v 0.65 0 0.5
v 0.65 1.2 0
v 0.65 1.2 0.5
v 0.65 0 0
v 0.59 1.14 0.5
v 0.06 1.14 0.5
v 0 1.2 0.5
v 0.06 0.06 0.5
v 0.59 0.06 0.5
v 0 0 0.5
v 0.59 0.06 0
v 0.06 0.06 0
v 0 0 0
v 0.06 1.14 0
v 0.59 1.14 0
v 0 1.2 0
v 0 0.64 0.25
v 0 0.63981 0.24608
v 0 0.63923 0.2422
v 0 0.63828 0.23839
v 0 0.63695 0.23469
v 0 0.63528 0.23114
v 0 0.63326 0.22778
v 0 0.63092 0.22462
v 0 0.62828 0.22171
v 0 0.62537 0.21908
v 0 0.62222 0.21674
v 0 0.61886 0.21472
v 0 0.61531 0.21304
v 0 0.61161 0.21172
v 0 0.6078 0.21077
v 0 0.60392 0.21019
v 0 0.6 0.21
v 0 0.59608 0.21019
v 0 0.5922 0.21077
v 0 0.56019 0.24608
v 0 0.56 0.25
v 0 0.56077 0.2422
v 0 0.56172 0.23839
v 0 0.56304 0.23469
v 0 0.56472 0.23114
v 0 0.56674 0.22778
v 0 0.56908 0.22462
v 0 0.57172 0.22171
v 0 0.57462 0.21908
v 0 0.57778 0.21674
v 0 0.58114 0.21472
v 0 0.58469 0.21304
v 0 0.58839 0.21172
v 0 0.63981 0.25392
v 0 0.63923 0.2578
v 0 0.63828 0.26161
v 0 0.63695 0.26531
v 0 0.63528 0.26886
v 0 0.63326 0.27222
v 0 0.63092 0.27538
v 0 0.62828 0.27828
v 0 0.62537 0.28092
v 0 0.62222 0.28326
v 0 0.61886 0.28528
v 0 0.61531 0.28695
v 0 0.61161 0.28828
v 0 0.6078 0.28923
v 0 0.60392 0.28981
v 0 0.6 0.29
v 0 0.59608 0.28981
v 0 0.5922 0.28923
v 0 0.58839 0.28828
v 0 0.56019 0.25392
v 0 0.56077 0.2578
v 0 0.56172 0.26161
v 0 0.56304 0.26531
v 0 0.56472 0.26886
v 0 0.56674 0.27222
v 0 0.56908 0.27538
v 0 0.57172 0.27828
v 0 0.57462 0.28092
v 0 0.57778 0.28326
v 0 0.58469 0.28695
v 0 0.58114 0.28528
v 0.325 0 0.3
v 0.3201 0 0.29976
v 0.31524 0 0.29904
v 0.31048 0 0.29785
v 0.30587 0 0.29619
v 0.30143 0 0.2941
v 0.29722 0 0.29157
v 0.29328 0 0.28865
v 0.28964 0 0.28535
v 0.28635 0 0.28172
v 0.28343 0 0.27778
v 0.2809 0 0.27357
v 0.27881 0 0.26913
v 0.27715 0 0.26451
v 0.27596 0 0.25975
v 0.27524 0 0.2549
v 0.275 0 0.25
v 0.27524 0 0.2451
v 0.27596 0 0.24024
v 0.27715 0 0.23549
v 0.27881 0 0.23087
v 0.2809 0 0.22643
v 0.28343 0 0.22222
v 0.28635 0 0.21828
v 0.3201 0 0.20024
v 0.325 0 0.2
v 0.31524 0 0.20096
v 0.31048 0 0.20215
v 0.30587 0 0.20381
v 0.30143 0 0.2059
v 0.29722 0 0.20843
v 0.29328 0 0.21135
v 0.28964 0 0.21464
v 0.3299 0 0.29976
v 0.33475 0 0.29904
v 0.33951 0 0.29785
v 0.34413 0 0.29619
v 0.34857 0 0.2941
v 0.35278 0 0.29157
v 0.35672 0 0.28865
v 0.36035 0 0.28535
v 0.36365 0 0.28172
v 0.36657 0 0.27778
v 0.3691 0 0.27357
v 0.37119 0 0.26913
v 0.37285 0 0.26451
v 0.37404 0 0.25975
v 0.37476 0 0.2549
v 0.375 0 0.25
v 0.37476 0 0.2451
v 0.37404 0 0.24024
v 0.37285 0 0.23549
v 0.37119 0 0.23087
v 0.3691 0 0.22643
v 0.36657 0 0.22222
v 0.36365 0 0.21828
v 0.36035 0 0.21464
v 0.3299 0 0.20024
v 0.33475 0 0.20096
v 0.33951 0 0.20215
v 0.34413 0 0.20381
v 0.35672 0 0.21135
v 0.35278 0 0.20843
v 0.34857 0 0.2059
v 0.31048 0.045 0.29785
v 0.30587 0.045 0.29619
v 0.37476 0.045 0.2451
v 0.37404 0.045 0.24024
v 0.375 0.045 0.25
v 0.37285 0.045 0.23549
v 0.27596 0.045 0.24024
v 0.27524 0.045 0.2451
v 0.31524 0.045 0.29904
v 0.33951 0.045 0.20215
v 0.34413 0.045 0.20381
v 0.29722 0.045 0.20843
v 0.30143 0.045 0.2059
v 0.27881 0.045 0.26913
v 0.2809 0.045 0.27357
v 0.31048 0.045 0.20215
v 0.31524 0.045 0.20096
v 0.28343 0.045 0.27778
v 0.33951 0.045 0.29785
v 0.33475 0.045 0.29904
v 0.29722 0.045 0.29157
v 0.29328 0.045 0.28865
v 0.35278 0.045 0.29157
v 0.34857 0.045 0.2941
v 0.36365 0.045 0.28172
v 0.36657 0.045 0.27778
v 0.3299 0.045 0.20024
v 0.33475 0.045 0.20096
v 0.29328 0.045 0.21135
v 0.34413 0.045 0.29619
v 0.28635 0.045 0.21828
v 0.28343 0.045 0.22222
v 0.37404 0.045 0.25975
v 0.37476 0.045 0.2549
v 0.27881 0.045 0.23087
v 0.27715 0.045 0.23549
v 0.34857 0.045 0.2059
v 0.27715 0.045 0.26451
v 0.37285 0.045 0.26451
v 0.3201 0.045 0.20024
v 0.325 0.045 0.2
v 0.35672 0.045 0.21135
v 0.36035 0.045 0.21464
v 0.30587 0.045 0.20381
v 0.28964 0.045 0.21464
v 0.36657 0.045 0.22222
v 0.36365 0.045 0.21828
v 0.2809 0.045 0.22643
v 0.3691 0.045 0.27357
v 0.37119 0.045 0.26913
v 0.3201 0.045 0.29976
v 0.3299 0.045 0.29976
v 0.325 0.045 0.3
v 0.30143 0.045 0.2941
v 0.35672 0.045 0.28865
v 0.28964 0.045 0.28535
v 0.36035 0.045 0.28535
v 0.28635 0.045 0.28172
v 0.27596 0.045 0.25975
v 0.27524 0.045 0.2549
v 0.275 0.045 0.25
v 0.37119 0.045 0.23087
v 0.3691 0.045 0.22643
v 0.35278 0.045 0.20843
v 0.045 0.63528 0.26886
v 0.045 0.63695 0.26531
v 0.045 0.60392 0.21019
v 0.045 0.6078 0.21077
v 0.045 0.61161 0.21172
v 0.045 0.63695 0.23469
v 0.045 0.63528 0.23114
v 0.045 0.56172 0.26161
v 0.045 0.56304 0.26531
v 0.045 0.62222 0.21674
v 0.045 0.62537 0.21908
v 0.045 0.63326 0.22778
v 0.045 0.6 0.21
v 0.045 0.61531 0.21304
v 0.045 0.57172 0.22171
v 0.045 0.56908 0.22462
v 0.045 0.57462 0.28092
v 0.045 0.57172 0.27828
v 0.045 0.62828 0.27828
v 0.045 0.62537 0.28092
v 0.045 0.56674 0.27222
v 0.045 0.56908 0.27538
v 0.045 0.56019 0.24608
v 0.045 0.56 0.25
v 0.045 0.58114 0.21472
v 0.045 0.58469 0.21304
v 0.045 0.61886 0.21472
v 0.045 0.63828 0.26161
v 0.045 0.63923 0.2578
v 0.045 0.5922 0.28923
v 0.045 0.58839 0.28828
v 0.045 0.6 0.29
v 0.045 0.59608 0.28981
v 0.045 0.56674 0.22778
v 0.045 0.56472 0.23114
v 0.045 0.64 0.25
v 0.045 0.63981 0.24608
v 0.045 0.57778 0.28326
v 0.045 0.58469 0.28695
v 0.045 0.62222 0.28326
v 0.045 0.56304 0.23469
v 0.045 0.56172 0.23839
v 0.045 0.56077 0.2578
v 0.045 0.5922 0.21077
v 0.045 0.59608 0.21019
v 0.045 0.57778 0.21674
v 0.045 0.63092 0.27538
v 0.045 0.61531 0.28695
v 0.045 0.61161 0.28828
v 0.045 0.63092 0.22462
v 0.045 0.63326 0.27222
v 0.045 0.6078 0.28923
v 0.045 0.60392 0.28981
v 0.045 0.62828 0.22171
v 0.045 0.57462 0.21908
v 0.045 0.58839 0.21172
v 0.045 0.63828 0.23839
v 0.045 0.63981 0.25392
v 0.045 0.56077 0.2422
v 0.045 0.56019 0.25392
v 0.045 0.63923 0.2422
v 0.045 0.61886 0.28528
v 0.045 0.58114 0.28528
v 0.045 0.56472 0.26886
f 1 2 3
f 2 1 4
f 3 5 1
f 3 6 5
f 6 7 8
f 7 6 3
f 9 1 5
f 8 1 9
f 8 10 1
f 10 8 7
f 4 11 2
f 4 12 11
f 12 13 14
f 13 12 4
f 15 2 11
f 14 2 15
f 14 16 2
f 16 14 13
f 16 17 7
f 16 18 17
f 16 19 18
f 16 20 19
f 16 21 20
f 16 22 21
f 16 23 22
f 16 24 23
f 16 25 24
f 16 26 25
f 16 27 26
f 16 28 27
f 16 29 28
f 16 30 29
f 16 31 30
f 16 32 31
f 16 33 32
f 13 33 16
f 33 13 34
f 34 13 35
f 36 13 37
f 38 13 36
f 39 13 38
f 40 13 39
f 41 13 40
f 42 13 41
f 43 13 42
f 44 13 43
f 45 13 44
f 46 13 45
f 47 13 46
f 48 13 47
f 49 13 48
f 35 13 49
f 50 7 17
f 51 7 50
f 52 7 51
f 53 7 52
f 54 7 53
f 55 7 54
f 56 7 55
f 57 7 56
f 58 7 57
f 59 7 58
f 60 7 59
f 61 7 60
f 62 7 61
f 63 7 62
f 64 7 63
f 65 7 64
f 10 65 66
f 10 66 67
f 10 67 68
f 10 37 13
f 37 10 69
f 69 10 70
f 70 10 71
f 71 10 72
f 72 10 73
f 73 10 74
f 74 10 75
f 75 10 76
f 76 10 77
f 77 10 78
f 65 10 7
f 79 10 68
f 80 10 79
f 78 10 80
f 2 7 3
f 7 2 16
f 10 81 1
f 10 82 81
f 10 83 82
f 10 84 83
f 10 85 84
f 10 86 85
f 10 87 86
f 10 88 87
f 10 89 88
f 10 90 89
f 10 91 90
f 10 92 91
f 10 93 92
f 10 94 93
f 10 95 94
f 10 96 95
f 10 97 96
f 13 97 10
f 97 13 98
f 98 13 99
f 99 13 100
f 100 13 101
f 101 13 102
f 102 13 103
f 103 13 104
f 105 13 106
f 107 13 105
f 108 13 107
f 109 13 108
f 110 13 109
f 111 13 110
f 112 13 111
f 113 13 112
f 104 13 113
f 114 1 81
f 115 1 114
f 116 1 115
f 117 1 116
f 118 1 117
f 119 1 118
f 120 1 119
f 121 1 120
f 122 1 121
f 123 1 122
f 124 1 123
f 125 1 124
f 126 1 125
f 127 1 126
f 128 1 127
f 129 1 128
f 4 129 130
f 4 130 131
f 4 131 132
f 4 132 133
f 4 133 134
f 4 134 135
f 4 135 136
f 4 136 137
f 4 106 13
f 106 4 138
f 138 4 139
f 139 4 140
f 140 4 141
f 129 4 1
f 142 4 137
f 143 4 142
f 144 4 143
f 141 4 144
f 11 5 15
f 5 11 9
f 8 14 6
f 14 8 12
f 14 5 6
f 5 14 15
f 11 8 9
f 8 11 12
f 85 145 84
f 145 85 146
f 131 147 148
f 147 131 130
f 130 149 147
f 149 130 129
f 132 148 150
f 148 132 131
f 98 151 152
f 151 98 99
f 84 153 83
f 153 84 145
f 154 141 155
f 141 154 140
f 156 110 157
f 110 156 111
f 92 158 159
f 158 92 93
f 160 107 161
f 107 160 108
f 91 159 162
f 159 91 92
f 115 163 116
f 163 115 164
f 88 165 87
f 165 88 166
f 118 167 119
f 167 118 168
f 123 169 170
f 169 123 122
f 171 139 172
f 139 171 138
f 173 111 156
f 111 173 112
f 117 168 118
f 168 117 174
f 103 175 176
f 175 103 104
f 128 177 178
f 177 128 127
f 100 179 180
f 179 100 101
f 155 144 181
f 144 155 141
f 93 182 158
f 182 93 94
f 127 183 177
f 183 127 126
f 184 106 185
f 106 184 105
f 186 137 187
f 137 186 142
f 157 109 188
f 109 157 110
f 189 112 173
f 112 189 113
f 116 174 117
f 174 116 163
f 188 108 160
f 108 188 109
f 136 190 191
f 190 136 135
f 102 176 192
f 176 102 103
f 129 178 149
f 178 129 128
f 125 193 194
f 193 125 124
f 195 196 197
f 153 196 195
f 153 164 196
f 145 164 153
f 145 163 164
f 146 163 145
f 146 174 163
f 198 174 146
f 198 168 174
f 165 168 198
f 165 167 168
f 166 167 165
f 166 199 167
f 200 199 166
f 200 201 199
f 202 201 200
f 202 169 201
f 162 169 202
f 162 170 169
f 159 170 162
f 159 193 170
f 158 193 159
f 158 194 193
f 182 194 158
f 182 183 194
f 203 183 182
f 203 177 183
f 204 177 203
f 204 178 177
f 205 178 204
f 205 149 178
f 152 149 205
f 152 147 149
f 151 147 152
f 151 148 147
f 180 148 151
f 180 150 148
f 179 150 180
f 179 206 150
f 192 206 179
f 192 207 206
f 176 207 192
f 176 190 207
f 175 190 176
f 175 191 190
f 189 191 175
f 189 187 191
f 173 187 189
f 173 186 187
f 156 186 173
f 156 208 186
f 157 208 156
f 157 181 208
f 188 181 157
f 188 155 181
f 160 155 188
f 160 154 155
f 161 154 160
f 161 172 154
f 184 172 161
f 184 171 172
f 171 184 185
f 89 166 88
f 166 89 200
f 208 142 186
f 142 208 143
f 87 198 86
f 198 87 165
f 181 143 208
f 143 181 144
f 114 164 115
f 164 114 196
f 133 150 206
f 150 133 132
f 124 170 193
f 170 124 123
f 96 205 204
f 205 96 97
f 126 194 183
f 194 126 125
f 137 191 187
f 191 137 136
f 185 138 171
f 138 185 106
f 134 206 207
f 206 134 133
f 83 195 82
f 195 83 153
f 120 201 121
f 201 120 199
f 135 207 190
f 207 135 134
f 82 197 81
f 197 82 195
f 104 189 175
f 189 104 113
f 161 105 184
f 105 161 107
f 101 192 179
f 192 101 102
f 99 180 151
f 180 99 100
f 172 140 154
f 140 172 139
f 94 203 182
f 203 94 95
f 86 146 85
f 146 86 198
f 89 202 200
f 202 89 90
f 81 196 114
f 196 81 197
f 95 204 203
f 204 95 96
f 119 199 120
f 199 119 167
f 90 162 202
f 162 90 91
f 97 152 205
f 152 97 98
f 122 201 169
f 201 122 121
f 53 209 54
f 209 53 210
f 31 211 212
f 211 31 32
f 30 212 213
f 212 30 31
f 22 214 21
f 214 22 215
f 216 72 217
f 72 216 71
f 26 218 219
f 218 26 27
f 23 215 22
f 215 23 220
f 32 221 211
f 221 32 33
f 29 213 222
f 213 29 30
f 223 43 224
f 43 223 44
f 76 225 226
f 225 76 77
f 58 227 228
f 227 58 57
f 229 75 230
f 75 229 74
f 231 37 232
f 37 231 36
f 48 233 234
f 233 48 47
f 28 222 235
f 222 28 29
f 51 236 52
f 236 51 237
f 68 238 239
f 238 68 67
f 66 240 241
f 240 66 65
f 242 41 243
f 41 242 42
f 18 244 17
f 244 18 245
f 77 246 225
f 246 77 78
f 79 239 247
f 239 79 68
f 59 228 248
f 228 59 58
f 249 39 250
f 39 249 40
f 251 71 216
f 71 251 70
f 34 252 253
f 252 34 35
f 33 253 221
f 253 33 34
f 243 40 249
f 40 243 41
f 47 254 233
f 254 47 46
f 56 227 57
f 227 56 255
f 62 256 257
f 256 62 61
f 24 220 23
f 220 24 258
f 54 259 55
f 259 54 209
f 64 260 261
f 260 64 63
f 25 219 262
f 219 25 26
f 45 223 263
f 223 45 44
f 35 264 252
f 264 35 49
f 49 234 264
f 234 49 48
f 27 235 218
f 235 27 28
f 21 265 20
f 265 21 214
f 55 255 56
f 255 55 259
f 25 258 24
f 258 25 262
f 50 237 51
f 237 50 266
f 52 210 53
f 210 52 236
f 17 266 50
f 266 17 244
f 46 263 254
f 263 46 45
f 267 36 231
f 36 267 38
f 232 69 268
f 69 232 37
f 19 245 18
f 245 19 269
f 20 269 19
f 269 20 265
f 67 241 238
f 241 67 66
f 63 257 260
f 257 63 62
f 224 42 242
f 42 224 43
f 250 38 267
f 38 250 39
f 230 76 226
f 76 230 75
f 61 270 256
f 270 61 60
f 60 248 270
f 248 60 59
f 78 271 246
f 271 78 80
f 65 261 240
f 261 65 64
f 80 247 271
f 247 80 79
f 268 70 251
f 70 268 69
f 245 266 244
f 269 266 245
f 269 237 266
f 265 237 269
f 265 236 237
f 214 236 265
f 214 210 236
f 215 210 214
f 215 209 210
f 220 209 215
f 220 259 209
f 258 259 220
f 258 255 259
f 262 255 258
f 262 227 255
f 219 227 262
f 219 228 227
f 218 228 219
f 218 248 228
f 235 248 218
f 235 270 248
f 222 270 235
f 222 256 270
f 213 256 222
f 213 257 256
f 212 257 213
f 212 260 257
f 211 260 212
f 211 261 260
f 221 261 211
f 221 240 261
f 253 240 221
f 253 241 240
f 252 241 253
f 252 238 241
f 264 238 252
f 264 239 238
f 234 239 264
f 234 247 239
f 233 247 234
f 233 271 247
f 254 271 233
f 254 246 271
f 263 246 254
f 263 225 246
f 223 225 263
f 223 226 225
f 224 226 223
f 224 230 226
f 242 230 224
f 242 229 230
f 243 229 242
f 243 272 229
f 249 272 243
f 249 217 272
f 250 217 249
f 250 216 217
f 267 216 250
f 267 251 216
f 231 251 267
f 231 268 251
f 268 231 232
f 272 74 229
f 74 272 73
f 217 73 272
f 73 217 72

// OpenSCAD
// Industrial Sensor Infrastructure - Motorized Pan-Tilt Articulating Cradle
$fn = 64;

// Structural Dimensions for Lightweight Servo Frame
cradle_width   = 0.65; // Inches
cradle_length  = 1.20; // Inches
cradle_height  = 0.50; // Inches
wall_thick     = 0.06; // 1.5mm structural ribbing

module articulating_servo_cradle() {
    difference() {
        // 1. Core Framework Bracket
        cube([cradle_width, cradle_length, cradle_height]);
        
        // 2. Central Structural Sleeve (Nests the Multi-Sensor Micro-Dongle snugly)
        translate([wall_thick, wall_thick, -0.05])
            cube([cradle_width - (wall_thick * 2), cradle_length - (wall_thick * 2), cradle_height + 0.1]);
            
        // 3. Primary Horizontal Actuator Mounting Ring (Pan Servo Connector)
        translate([cradle_width / 2, -0.01, cradle_height / 2])
            rotate([-90, 0, 0])
                cylinder(h = wall_thick + 0.05, d = 0.10, center = true); // Fits industry-standard micro-servo horns
                
        // 4. Secondary Vertical Actuator Pivot Index (Tilt Servo Pin)
        translate([-0.01, cradle_length / 2, cradle_height / 2])
            rotate([0, 90, 0])
                cylinder(h = wall_thick + 0.05, d = 0.08, center = true);
    }
}

articulating_servo_cradle();
